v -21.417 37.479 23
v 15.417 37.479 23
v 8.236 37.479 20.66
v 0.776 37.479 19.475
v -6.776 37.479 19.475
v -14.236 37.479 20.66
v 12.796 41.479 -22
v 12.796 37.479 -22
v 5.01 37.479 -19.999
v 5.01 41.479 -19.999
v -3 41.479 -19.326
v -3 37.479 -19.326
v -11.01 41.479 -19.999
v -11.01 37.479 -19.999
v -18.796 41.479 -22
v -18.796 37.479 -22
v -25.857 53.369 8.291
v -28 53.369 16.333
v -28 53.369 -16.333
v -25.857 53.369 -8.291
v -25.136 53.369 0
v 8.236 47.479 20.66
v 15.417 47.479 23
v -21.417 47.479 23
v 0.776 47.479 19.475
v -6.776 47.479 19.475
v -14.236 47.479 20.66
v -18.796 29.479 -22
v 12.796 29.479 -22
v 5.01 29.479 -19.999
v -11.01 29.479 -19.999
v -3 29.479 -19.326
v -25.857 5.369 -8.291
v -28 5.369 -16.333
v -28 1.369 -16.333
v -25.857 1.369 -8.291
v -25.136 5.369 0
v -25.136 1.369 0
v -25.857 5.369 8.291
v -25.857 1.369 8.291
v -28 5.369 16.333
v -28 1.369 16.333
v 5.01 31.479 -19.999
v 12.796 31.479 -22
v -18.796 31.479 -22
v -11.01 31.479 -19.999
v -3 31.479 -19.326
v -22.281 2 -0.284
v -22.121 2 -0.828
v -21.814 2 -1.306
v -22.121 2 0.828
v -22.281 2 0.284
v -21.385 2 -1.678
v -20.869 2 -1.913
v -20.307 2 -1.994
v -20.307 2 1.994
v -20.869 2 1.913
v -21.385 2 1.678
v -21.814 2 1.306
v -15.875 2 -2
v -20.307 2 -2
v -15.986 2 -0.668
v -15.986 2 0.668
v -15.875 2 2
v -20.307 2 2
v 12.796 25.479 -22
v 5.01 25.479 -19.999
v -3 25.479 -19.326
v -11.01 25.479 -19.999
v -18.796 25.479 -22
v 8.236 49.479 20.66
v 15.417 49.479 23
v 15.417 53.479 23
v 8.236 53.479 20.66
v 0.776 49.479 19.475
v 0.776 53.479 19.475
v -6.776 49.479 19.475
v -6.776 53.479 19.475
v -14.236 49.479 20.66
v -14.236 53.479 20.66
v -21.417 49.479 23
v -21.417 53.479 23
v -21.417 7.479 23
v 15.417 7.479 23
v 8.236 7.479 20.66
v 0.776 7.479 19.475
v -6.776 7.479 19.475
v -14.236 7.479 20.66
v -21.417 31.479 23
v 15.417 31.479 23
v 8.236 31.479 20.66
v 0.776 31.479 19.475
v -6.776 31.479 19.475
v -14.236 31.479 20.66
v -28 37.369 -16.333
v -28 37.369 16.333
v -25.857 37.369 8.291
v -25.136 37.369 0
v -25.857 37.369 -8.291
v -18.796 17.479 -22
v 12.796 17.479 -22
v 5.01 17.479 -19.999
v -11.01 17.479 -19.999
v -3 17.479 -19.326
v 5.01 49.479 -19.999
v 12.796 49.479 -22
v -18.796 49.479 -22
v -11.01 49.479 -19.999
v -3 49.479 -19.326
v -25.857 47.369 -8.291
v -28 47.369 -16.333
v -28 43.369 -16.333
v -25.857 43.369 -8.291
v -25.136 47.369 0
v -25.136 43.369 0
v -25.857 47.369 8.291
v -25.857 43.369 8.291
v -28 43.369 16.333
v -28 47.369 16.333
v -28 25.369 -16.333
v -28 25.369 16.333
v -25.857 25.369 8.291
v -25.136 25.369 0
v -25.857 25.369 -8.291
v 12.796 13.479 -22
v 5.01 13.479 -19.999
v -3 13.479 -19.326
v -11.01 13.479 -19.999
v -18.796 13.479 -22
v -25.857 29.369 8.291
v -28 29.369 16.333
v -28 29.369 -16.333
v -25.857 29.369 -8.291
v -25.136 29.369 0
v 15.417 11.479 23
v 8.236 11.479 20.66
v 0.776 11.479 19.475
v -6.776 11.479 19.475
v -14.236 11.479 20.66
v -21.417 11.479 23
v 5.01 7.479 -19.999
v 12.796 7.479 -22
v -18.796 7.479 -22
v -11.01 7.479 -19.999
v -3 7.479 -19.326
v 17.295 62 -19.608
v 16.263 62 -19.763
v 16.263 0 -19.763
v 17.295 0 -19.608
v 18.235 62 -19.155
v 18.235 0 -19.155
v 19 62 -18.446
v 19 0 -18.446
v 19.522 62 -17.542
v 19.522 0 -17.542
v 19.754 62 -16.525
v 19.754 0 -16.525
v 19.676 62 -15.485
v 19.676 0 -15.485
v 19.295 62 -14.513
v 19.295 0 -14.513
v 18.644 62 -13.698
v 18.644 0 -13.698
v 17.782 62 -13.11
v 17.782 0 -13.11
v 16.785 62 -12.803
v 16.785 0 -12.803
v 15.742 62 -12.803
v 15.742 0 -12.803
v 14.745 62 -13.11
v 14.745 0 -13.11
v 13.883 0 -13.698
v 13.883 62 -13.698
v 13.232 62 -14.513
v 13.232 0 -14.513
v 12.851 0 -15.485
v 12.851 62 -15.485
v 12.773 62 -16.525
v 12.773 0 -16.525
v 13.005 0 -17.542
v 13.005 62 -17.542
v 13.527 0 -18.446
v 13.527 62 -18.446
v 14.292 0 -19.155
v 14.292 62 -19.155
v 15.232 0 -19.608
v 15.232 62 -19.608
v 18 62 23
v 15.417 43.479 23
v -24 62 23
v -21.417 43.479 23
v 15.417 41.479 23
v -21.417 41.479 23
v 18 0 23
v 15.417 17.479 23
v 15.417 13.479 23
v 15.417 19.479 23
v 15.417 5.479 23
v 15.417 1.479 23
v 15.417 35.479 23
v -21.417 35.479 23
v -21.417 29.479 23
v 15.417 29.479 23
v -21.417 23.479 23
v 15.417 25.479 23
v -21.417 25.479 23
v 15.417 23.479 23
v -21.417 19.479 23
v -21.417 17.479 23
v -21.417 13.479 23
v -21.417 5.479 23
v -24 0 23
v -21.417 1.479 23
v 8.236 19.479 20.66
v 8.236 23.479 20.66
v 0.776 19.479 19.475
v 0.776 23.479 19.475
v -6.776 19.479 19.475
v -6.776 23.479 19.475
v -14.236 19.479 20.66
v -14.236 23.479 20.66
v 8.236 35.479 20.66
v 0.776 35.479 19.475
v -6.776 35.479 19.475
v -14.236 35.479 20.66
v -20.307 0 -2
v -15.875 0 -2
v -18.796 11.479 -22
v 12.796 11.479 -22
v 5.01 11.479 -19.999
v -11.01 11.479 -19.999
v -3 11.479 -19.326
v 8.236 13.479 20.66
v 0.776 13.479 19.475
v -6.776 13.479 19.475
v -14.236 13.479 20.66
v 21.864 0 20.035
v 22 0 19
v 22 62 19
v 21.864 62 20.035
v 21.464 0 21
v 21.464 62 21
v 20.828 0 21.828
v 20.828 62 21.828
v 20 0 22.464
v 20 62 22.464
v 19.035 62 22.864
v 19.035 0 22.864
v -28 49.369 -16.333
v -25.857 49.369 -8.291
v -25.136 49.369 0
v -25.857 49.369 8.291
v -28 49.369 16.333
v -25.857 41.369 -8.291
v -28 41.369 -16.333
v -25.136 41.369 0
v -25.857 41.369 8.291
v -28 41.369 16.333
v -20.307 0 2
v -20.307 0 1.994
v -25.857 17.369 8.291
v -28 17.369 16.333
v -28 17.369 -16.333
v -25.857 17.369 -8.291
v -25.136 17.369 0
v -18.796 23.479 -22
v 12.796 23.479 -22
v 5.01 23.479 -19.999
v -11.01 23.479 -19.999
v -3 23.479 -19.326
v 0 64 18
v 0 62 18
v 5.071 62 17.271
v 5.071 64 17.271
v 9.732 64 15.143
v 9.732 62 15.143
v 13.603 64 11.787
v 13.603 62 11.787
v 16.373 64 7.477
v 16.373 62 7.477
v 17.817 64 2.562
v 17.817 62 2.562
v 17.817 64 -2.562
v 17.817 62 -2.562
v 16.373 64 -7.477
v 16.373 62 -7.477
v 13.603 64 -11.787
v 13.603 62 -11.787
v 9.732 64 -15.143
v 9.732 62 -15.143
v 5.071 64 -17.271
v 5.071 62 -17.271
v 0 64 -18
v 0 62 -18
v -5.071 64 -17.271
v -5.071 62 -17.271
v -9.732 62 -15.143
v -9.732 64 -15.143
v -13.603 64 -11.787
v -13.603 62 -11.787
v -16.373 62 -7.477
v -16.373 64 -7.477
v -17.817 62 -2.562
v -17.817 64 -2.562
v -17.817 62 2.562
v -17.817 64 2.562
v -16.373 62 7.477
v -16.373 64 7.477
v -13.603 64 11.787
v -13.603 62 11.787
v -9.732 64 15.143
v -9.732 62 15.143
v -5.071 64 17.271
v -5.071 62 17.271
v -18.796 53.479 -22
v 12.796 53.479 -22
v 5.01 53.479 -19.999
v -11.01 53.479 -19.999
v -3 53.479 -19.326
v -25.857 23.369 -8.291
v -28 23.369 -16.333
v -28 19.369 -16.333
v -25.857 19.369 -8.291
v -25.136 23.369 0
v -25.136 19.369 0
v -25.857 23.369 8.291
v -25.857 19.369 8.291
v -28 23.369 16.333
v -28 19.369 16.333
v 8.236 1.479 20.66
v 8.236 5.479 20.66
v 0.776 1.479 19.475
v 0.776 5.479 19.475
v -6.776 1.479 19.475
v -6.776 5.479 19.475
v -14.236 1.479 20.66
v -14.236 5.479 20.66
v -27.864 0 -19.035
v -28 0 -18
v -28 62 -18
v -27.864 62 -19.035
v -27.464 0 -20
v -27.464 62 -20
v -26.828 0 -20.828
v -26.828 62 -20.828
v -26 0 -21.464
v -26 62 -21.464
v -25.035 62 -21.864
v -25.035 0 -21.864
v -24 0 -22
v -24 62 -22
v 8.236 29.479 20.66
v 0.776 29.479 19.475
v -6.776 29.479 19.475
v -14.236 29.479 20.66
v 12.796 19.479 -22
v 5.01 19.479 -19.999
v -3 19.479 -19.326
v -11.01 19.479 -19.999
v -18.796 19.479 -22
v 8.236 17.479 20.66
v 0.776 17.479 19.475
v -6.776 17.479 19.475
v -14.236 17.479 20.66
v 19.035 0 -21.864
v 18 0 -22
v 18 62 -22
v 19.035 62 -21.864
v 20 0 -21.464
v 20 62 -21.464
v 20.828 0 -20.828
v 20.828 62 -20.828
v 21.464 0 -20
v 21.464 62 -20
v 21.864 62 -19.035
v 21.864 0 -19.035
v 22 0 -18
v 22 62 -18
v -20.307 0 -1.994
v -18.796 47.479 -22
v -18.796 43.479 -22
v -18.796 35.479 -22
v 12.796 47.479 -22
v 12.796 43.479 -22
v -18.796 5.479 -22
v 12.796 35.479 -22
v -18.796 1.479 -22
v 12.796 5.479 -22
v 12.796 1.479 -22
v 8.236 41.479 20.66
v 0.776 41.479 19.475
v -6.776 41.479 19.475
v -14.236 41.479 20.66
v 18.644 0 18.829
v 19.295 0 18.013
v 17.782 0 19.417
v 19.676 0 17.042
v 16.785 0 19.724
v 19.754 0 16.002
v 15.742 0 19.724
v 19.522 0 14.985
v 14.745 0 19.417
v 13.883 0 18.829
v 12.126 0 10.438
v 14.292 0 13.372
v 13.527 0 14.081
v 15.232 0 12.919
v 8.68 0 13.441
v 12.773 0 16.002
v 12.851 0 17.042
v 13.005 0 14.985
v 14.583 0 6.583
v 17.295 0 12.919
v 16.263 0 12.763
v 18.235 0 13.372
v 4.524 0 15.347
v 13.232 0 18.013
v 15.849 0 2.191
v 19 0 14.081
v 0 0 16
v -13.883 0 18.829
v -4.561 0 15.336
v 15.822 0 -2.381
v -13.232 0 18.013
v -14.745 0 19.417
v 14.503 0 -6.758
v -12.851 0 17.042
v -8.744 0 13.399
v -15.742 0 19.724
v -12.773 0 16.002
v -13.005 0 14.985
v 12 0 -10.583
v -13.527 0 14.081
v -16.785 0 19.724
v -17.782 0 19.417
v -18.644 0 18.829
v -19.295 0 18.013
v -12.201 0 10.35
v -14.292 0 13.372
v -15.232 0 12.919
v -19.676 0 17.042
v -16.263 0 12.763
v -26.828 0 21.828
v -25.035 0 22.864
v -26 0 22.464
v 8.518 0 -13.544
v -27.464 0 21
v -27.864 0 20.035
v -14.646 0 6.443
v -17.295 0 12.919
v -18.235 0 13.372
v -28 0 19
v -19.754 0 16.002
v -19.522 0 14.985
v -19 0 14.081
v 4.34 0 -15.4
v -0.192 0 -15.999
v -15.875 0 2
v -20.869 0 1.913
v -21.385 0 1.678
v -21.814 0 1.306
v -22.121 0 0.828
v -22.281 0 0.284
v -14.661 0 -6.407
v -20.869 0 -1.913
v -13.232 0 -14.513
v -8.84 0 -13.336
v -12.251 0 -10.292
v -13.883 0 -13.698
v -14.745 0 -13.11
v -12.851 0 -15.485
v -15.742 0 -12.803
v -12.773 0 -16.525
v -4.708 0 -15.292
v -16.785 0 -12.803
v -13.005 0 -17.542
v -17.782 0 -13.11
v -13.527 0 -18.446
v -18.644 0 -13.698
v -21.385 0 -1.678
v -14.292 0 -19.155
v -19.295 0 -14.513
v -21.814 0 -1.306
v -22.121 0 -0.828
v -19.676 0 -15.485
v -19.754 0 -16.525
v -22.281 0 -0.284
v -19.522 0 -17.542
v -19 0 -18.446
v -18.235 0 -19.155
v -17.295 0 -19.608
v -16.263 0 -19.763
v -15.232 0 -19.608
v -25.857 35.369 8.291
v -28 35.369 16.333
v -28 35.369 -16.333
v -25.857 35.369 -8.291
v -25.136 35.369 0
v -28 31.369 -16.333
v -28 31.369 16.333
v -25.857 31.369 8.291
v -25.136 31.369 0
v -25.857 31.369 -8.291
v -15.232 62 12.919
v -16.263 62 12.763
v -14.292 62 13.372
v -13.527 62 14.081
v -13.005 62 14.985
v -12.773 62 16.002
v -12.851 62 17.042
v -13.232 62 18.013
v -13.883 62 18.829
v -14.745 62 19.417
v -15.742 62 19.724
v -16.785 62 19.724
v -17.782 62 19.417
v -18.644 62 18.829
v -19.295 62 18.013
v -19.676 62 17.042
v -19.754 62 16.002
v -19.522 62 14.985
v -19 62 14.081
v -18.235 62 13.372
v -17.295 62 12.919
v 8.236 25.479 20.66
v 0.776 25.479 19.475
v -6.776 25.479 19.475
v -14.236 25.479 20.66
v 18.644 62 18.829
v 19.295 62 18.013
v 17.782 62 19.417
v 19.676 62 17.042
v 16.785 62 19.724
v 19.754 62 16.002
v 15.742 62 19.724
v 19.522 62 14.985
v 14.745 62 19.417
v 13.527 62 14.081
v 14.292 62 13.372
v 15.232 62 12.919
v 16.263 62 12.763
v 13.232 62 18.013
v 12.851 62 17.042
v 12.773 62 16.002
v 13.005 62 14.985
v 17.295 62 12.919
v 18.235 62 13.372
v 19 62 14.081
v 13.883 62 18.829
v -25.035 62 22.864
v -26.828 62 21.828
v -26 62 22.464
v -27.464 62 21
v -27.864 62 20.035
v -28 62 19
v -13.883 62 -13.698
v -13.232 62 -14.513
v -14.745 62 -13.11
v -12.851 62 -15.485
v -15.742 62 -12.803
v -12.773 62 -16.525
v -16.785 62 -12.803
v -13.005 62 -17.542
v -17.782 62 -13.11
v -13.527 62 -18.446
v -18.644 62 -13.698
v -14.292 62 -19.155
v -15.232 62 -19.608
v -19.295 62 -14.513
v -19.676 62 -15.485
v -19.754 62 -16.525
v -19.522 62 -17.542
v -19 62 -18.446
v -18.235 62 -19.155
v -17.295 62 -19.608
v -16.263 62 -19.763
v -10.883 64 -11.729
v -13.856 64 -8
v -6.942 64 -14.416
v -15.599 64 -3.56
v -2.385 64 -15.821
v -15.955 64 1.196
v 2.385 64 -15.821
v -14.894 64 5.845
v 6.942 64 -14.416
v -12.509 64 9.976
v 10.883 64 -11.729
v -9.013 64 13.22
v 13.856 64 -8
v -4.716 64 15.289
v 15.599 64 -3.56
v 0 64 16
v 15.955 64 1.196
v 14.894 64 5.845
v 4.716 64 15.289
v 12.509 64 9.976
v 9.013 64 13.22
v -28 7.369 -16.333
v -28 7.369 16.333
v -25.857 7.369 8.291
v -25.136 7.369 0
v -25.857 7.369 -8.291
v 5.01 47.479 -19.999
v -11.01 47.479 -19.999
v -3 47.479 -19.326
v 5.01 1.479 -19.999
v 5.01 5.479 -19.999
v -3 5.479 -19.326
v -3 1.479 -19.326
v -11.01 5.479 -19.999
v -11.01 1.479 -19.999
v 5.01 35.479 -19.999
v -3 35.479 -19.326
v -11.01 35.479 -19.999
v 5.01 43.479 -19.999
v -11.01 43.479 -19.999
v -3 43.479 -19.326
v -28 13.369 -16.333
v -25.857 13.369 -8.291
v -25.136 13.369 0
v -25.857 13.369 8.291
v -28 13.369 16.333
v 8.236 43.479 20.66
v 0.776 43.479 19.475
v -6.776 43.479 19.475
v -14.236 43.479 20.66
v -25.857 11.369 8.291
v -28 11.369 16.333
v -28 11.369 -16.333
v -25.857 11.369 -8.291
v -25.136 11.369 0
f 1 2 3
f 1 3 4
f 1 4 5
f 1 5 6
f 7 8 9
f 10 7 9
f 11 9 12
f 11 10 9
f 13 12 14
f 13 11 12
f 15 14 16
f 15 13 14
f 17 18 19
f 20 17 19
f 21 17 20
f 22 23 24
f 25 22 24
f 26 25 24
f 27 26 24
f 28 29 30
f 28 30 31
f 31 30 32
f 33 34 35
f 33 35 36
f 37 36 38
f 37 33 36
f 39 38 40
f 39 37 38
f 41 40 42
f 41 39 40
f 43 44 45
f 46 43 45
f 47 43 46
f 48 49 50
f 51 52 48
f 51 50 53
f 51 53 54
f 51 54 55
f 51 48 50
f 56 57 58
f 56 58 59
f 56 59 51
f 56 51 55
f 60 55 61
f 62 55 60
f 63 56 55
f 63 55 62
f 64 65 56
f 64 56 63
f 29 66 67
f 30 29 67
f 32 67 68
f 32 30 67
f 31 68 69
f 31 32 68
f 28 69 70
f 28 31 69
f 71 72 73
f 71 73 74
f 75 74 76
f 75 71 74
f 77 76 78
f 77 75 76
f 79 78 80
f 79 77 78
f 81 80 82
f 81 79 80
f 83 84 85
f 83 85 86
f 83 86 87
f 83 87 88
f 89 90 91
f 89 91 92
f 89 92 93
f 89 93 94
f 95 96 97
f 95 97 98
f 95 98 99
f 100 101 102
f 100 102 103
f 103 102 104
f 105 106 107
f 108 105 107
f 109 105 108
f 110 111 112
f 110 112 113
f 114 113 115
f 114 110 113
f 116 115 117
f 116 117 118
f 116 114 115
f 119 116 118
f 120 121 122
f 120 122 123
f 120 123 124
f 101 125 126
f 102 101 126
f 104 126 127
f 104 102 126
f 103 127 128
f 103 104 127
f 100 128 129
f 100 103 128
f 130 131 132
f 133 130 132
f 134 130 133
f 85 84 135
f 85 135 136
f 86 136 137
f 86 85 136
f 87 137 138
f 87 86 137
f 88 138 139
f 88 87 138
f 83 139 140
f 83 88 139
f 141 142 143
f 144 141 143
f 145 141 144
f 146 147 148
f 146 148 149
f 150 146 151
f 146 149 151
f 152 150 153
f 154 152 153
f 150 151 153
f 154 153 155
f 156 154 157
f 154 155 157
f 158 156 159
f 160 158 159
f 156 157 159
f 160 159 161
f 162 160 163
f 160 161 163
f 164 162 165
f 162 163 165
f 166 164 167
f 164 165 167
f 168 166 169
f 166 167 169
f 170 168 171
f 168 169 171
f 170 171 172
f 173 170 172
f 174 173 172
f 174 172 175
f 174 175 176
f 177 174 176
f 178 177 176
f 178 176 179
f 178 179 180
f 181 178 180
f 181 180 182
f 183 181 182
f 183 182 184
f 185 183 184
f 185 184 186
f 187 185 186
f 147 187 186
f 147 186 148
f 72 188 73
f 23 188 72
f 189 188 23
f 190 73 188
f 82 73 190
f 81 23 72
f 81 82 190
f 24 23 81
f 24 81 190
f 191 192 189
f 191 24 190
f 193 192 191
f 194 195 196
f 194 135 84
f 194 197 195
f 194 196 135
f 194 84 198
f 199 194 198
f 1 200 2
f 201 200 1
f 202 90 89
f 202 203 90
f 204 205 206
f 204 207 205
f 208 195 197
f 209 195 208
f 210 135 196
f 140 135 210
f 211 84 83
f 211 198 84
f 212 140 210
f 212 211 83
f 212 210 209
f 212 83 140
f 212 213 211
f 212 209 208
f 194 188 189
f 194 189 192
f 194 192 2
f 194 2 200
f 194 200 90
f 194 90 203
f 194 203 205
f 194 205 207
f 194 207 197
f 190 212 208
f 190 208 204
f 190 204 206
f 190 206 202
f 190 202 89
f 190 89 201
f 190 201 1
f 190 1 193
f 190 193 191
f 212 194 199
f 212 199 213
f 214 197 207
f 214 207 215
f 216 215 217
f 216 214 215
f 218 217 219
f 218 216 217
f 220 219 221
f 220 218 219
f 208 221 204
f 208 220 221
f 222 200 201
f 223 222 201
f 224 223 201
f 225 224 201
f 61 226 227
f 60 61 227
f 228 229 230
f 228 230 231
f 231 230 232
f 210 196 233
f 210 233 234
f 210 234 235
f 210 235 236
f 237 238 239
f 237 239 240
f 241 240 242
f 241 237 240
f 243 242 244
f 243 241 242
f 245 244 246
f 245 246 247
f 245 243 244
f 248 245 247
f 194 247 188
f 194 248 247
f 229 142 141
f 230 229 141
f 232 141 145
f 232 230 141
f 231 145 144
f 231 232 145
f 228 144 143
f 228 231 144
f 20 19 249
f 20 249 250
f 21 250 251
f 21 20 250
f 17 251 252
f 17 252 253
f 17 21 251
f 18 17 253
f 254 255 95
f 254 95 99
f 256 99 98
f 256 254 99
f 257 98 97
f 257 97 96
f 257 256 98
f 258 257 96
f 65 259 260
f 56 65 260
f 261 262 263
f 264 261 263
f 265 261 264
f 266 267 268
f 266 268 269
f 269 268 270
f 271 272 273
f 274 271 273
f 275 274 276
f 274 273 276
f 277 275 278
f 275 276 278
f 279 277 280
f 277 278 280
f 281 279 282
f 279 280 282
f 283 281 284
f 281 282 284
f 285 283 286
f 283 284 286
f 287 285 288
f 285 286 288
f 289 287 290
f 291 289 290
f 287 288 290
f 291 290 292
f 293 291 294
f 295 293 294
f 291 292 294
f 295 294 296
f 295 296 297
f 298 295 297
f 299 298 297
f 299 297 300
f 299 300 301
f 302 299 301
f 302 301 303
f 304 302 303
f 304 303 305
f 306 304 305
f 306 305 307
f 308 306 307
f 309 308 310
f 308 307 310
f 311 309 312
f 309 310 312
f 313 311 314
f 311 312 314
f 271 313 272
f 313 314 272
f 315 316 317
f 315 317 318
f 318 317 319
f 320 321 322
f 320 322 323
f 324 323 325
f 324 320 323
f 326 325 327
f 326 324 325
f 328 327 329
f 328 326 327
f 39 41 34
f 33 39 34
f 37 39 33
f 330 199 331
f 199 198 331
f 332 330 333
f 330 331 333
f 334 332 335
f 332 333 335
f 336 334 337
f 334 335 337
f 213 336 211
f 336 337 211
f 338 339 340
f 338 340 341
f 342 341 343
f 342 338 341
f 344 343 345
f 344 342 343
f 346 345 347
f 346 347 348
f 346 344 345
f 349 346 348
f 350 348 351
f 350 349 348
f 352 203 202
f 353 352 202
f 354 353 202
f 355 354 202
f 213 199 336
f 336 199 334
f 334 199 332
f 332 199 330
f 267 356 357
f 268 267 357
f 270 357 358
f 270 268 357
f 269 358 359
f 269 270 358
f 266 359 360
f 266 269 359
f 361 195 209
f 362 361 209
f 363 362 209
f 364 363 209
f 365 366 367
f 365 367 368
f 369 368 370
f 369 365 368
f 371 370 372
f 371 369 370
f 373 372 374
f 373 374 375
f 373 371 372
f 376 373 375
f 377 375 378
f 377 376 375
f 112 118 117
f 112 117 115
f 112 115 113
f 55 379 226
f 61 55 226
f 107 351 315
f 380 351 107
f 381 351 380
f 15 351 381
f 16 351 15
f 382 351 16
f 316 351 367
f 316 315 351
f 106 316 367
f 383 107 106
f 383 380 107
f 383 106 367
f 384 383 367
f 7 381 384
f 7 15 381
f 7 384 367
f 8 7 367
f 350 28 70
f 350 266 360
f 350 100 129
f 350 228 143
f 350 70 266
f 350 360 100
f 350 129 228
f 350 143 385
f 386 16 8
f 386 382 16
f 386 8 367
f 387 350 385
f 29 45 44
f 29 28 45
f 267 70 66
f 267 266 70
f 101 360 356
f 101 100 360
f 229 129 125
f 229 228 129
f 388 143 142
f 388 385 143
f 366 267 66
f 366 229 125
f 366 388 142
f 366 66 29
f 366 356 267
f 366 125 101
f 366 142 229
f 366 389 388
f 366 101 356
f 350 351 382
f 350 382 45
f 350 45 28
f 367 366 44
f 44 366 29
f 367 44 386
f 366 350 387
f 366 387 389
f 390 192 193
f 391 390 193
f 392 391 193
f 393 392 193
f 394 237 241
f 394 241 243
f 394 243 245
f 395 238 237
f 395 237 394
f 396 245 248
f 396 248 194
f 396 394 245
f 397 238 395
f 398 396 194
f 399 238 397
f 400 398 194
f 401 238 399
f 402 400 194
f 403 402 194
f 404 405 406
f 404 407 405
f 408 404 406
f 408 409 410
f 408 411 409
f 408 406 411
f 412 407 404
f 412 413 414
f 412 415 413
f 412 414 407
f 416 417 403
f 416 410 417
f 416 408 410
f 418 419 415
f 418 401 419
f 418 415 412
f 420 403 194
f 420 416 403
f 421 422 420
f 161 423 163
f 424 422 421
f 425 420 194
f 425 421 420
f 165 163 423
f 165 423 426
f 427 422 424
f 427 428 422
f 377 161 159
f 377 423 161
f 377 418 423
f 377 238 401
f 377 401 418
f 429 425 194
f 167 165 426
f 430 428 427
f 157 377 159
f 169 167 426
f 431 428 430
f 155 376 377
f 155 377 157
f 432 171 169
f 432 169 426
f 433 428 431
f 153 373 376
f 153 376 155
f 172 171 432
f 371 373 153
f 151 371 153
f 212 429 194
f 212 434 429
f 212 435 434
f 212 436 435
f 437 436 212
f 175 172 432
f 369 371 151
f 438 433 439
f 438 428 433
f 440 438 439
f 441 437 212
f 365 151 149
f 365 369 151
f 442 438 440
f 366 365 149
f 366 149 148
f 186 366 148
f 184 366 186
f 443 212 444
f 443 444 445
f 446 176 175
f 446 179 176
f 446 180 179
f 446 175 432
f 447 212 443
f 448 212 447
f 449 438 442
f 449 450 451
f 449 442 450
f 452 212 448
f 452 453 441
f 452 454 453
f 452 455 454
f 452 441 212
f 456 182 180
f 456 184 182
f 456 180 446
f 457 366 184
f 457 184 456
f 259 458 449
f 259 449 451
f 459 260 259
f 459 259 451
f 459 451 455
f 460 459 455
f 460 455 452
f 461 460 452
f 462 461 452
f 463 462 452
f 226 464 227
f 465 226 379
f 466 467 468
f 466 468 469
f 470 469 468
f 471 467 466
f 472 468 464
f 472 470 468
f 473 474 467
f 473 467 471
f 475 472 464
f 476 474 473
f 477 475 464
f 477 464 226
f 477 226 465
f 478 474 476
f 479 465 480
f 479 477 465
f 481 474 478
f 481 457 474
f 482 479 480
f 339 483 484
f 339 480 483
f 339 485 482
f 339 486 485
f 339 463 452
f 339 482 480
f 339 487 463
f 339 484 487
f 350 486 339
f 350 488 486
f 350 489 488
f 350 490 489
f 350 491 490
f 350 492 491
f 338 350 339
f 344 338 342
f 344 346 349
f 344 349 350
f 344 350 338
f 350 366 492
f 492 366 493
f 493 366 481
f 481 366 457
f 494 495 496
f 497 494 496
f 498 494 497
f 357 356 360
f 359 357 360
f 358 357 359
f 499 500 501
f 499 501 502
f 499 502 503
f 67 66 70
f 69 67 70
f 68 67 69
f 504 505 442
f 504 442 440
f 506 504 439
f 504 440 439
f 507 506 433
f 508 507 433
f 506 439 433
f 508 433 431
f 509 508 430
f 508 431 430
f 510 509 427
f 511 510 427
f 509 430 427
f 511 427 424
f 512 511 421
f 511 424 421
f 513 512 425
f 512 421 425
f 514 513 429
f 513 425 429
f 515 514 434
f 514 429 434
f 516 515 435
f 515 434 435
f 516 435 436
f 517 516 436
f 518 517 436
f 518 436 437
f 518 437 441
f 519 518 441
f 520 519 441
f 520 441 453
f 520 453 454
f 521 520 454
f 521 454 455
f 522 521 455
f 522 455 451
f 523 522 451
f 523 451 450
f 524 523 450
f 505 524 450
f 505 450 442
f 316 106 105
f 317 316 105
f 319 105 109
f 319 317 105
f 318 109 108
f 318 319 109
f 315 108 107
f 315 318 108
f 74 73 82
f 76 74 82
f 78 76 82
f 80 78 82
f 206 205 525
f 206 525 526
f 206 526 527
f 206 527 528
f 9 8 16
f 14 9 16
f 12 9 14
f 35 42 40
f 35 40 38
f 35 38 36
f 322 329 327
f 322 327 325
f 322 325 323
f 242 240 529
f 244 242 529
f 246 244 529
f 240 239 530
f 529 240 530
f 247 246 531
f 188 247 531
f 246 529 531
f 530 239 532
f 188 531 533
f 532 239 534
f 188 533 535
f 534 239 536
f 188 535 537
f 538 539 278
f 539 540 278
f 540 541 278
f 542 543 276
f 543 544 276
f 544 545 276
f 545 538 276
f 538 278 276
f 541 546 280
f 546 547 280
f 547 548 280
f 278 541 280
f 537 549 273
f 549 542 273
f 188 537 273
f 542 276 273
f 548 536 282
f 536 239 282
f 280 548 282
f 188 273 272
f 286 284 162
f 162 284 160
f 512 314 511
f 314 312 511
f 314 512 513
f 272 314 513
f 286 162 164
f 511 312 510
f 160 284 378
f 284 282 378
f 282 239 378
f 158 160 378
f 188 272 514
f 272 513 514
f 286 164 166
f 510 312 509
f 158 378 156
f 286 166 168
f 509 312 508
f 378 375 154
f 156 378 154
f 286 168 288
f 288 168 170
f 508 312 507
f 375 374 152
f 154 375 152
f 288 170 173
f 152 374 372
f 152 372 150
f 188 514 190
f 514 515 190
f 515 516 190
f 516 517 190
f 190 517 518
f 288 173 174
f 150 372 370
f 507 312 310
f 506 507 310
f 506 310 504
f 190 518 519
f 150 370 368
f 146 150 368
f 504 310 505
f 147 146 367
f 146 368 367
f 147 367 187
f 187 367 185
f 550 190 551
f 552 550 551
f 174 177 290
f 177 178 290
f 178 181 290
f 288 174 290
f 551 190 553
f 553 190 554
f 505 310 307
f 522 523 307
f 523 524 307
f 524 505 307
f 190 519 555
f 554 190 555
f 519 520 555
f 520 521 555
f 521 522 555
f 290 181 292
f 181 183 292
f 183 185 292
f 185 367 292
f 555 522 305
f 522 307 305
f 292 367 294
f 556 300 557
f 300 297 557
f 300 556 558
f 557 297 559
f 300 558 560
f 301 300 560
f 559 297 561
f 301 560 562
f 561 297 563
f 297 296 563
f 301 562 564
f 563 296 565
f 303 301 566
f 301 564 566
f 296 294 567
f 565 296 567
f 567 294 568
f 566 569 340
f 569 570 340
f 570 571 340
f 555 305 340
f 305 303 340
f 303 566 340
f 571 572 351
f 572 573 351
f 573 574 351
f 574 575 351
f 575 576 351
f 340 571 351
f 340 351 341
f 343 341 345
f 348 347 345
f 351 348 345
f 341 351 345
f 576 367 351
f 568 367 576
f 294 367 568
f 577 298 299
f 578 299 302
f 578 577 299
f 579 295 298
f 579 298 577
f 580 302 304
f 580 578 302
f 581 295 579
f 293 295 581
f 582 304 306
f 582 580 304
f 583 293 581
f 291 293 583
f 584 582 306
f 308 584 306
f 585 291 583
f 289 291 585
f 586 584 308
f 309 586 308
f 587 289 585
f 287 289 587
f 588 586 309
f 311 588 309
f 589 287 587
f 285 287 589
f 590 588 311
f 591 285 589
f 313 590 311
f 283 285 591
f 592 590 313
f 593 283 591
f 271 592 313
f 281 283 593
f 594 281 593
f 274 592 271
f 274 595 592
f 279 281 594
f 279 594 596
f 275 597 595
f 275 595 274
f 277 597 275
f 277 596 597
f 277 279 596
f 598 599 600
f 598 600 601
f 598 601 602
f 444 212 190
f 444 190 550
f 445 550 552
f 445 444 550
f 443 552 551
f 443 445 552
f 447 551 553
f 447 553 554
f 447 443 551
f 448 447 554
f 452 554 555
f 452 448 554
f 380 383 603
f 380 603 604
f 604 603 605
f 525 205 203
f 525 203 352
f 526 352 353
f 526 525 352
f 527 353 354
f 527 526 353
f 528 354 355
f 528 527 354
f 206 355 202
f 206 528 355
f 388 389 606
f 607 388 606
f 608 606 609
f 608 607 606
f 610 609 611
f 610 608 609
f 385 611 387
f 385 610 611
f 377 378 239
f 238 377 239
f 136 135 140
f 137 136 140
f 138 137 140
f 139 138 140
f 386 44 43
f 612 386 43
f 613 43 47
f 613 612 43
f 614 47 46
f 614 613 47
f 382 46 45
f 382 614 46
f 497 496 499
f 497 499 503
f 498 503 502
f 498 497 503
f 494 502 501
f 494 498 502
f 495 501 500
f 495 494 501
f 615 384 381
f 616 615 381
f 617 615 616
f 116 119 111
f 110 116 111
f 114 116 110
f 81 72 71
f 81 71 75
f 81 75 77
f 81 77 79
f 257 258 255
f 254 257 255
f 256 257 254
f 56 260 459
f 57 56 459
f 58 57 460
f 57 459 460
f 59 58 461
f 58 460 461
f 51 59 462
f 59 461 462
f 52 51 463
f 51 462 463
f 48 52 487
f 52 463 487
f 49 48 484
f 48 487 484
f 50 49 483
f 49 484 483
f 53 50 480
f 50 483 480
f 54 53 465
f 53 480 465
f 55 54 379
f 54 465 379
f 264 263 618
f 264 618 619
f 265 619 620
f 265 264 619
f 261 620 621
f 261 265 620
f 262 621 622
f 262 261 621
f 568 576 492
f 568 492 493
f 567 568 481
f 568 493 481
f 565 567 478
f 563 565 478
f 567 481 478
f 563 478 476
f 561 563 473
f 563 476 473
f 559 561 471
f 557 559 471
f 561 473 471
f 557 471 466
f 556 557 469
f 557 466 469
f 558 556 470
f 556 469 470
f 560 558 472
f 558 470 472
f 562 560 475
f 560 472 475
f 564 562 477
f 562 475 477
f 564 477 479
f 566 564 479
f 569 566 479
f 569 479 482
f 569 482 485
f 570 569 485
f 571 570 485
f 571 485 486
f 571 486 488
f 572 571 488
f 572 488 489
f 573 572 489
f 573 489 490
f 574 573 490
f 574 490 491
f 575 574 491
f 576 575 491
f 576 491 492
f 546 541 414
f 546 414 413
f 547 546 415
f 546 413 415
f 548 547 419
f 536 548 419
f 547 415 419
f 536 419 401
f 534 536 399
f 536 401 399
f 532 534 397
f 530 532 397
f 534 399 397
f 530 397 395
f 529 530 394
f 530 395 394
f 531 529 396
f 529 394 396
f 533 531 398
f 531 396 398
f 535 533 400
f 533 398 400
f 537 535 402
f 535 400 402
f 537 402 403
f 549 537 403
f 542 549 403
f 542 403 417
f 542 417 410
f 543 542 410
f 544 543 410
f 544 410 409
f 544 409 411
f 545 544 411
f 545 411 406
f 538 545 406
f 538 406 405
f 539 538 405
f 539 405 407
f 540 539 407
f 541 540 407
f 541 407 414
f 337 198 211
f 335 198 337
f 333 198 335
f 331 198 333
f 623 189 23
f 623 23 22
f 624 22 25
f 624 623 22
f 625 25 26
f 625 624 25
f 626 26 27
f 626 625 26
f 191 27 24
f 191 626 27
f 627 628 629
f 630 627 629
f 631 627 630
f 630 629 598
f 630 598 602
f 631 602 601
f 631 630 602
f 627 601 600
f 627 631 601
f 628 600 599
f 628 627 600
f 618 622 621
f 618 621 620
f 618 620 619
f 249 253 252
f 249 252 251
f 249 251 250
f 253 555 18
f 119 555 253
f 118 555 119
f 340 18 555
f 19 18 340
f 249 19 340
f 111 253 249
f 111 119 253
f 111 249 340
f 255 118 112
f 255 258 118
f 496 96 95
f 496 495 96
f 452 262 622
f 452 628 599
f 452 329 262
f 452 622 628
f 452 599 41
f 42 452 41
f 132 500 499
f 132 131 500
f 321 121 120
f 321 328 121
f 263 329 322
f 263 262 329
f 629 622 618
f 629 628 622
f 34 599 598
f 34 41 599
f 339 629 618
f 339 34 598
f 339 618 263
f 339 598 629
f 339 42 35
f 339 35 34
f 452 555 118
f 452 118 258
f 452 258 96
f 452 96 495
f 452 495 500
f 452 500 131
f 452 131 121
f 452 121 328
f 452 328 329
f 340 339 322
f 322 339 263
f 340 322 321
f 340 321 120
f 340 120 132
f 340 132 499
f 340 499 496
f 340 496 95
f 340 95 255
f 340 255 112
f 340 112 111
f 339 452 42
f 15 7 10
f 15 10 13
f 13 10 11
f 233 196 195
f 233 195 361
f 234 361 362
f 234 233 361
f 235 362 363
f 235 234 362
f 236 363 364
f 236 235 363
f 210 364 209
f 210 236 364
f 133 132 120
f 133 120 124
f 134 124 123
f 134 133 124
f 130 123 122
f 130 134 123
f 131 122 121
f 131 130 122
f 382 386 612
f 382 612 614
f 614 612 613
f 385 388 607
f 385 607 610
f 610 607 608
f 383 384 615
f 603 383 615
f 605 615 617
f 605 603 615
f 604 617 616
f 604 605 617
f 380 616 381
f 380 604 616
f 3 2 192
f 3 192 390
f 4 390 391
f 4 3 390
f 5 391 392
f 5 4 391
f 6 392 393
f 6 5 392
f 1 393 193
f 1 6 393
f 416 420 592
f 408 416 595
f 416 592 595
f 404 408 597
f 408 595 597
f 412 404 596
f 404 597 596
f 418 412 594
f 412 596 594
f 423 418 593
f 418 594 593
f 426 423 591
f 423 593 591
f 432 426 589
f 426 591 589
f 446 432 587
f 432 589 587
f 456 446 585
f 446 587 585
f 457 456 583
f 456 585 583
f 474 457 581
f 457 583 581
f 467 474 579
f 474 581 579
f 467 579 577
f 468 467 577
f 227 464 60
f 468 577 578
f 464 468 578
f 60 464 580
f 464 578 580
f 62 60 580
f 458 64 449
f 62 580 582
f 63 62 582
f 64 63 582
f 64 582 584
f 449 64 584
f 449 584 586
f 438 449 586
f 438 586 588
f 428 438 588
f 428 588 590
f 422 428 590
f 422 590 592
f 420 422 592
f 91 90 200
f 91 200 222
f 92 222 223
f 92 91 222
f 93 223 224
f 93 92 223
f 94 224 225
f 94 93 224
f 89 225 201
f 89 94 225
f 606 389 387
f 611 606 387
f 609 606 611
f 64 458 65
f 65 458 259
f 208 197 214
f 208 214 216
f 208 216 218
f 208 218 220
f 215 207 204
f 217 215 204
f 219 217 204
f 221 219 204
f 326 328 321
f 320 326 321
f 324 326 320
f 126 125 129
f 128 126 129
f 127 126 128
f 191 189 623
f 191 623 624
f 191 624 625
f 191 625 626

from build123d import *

# Parameters (mm, degrees)
BOSS_EXTRUDE1_DEPTH     = 62
SKETCH2_R               = 18
BOSS_EXTRUDE2_DEPTH     = 2
SKETCH3_R               = 16
CUT_EXTRUDE1_DEPTH      = 74.545904033
CUT_EXTRUDE2_DEPTH      = 2
SKETCH5_R               = 3.5
CUT_EXTRUDE3_DEPTH      = 74.545904033
SKETCH7_W               = 48
SKETCH7_H               = 4
LPATTERN1_COUNT         = 9
LPATTERN1_PITCH         = 6
MIRROR1_COPY_1_SKETCH_W = 48
MIRROR1_COPY_1_SKETCH_H = 4
MIRROR1_COPY_2_SKETCH_W = 48
MIRROR1_COPY_2_SKETCH_H = 4
MIRROR1_COPY_3_SKETCH_W = 48
MIRROR1_COPY_3_SKETCH_H = 4
MIRROR1_COPY_4_SKETCH_W = 48
MIRROR1_COPY_4_SKETCH_H = 4
MIRROR1_COPY_5_SKETCH_W = 48
MIRROR1_COPY_5_SKETCH_H = 4
MIRROR1_COPY_6_SKETCH_W = 48
MIRROR1_COPY_6_SKETCH_H = 4
MIRROR1_COPY_7_SKETCH_W = 48
MIRROR1_COPY_7_SKETCH_H = 4
MIRROR1_COPY_8_SKETCH_W = 48
MIRROR1_COPY_8_SKETCH_H = 4
SKETCH10_W              = 48
SKETCH10_H              = 4
LPATTERN2_COUNT         = 9
LPATTERN2_PITCH         = 6


with BuildPart() as part:
    # Sketch1 → Boss-Extrude1 (new body)
    with BuildSketch(Plane(origin=(0, 0, 0), x_dir=(1, 0, 0), z_dir=(0, 1, 0))):
        with BuildLine():
            Line((-24, 22), (18, 22))
            ThreePointArc((18, 22), (20.828427125, 20.828427125), (22, 18))
            Line((22, 18), (22, -19))
            ThreePointArc((22, -19), (20.828427125, -21.828427125), (18, -23))
            Line((18, -23), (-24, -23))
            ThreePointArc((-24, -23), (-26.828427125, -21.828427125), (-28, -19))
            Line((-28, -19), (-28, 18))
            ThreePointArc((-28, 18), (-26.828427125, 20.828427125), (-24, 22))
        make_face()
    extrude(amount=BOSS_EXTRUDE1_DEPTH)

    # Sketch2 → Boss-Extrude2 (add)
    with BuildSketch(Plane(origin=(0, 62, 0), x_dir=(1, 0, 0), z_dir=(0, 1, 0))):
        with Locations(Location((0, 0, 0), (0, 0, 270))):
            Circle(SKETCH2_R)
    extrude(amount=BOSS_EXTRUDE2_DEPTH)

    # Sketch3 → Cut-Extrude1 (cut, through all)
    with BuildSketch(Plane(origin=(0, 64, 0), x_dir=(1, 0, 0), z_dir=(0, 1, 0))):
        with Locations(Location((0, 0, 0), (0, 0, 270))):
            Circle(SKETCH3_R)
    extrude(amount=-CUT_EXTRUDE1_DEPTH, mode=Mode.SUBTRACT)

    # Sketch4 → Cut-Extrude2 (cut)
    with BuildSketch(Plane.XZ):
        with BuildLine():
            Line((-20.306853537, -1.994120307), (-20.306853537, -2))
            Line((-20.306853537, -2), (-10.443807973, -2))
            Line((-10.443807973, -2), (-10.443807973, 2))
            Line((-10.443807973, 2), (-20.306853537, 2))
            Line((-20.306853537, 2), (-20.306853537, 1.994120307))
            ThreePointArc((-20.306853537, 1.994120307), (-22.300973844, 0), (-20.306853537, -1.994120307))
        make_face()
    extrude(amount=-CUT_EXTRUDE2_DEPTH, mode=Mode.SUBTRACT)

    # Sketch5 → Cut-Extrude3 (cut, through all)
    with BuildSketch(Plane.XZ):
        with Locations(Location((16.263455967, 16.263455967, 0), (0, 0, 270))):
            Circle(SKETCH5_R)
        with Locations(Location((16.263455967, -16.263455967, 0), (0, 0, 270))):
            Circle(SKETCH5_R)
        with Locations(Location((-16.263455967, -16.263455967, 0), (0, 0, 270))):
            Circle(SKETCH5_R)
        with Locations(Location((-16.263455967, 16.263455967, 0), (0, 0, 270))):
            Circle(SKETCH5_R)
    extrude(amount=-CUT_EXTRUDE3_DEPTH, mode=Mode.SUBTRACT)

    # Sketch7 → Cut-Revolve1 (revolve, cut)
    with BuildSketch(Plane(origin=(-3, 0, 0), x_dir=(0, 0, -1), z_dir=(1, 0, 0))):
        with Locations((43.326339521, 3.479284524)):
            Rectangle(SKETCH7_W, SKETCH7_H)
    cut_revolve1 = revolve(axis=Axis((-3, 5.479284524, -67.326339521), (0, -1, 0)), mode=Mode.SUBTRACT)

    # LPattern1: Cut-Revolve1 ×9
    with Locations(*[(0, i * LPATTERN1_PITCH, 0) for i in range(1, LPATTERN1_COUNT)]):
        add(cut_revolve1, mode=Mode.SUBTRACT)

    # Mirror1: Cut-Revolve1 across plane
    add(cut_revolve1.mirror(Plane.XY), mode=Mode.SUBTRACT)

    # Mirror1 copy 1 sketch → Mirror1 copy 1 (revolve, cut)
    with BuildSketch(Plane(origin=(-3, 6, 0), x_dir=(0, 0, 1), z_dir=(1, 0, 0))):
        with Locations((43.326339521, -3.479284524)):
            Rectangle(MIRROR1_COPY_1_SKETCH_W, MIRROR1_COPY_1_SKETCH_H)
    revolve(axis=Axis((-3, 11.479284524, 67.326339521), (0, 1, 0)), mode=Mode.SUBTRACT)

    # Mirror1 copy 2 sketch → Mirror1 copy 2 (revolve, cut)
    with BuildSketch(Plane(origin=(-3, 12, 0), x_dir=(0, 0, 1), z_dir=(1, 0, 0))):
        with Locations((43.326339521, -3.479284524)):
            Rectangle(MIRROR1_COPY_2_SKETCH_W, MIRROR1_COPY_2_SKETCH_H)
    revolve(axis=Axis((-3, 17.479284524, 67.326339521), (0, 1, 0)), mode=Mode.SUBTRACT)

    # Mirror1 copy 3 sketch → Mirror1 copy 3 (revolve, cut)
    with BuildSketch(Plane(origin=(-3, 18, 0), x_dir=(0, 0, 1), z_dir=(1, 0, 0))):
        with Locations((43.326339521, -3.479284524)):
            Rectangle(MIRROR1_COPY_3_SKETCH_W, MIRROR1_COPY_3_SKETCH_H)
    revolve(axis=Axis((-3, 23.479284524, 67.326339521), (0, 1, 0)), mode=Mode.SUBTRACT)

    # Mirror1 copy 4 sketch → Mirror1 copy 4 (revolve, cut)
    with BuildSketch(Plane(origin=(-3, 24, 0), x_dir=(0, 0, 1), z_dir=(1, 0, 0))):
        with Locations((43.326339521, -3.479284524)):
            Rectangle(MIRROR1_COPY_4_SKETCH_W, MIRROR1_COPY_4_SKETCH_H)
    revolve(axis=Axis((-3, 29.479284524, 67.326339521), (0, 1, 0)), mode=Mode.SUBTRACT)

    # Mirror1 copy 5 sketch → Mirror1 copy 5 (revolve, cut)
    with BuildSketch(Plane(origin=(-3, 30, 0), x_dir=(0, 0, 1), z_dir=(1, 0, 0))):
        with Locations((43.326339521, -3.479284524)):
            Rectangle(MIRROR1_COPY_5_SKETCH_W, MIRROR1_COPY_5_SKETCH_H)
    revolve(axis=Axis((-3, 35.479284524, 67.326339521), (0, 1, 0)), mode=Mode.SUBTRACT)

    # Mirror1 copy 6 sketch → Mirror1 copy 6 (revolve, cut)
    with BuildSketch(Plane(origin=(-3, 36, 0), x_dir=(0, 0, 1), z_dir=(1, 0, 0))):
        with Locations((43.326339521, -3.479284524)):
            Rectangle(MIRROR1_COPY_6_SKETCH_W, MIRROR1_COPY_6_SKETCH_H)
    revolve(axis=Axis((-3, 41.479284524, 67.326339521), (0, 1, 0)), mode=Mode.SUBTRACT)

    # Mirror1 copy 7 sketch → Mirror1 copy 7 (revolve, cut)
    with BuildSketch(Plane(origin=(-3, 42, 0), x_dir=(0, 0, 1), z_dir=(1, 0, 0))):
        with Locations((43.326339521, -3.479284524)):
            Rectangle(MIRROR1_COPY_7_SKETCH_W, MIRROR1_COPY_7_SKETCH_H)
    revolve(axis=Axis((-3, 47.479284524, 67.326339521), (0, 1, 0)), mode=Mode.SUBTRACT)

    # Mirror1 copy 8 sketch → Mirror1 copy 8 (revolve, cut)
    with BuildSketch(Plane(origin=(-3, 48, 0), x_dir=(0, 0, 1), z_dir=(1, 0, 0))):
        with Locations((43.326339521, -3.479284524)):
            Rectangle(MIRROR1_COPY_8_SKETCH_W, MIRROR1_COPY_8_SKETCH_H)
    revolve(axis=Axis((-3, 53.479284524, 67.326339521), (0, 1, 0)), mode=Mode.SUBTRACT)

    # Sketch10 → Cut-Revolve2 (revolve, cut)
    with BuildSketch(Plane.XY):
        with Locations((-49.135889072, 3.369439349)):
            Rectangle(SKETCH10_W, SKETCH10_H)
    cut_revolve2 = revolve(axis=Axis((-73.135889072, 5.369439349, 0), (0, -1, 0)), mode=Mode.SUBTRACT)

    # LPattern2: Cut-Revolve2 ×9
    with Locations(*[(0, i * LPATTERN2_PITCH, 0) for i in range(1, LPATTERN2_COUNT)]):
        add(cut_revolve2, mode=Mode.SUBTRACT)


solid = part.part
